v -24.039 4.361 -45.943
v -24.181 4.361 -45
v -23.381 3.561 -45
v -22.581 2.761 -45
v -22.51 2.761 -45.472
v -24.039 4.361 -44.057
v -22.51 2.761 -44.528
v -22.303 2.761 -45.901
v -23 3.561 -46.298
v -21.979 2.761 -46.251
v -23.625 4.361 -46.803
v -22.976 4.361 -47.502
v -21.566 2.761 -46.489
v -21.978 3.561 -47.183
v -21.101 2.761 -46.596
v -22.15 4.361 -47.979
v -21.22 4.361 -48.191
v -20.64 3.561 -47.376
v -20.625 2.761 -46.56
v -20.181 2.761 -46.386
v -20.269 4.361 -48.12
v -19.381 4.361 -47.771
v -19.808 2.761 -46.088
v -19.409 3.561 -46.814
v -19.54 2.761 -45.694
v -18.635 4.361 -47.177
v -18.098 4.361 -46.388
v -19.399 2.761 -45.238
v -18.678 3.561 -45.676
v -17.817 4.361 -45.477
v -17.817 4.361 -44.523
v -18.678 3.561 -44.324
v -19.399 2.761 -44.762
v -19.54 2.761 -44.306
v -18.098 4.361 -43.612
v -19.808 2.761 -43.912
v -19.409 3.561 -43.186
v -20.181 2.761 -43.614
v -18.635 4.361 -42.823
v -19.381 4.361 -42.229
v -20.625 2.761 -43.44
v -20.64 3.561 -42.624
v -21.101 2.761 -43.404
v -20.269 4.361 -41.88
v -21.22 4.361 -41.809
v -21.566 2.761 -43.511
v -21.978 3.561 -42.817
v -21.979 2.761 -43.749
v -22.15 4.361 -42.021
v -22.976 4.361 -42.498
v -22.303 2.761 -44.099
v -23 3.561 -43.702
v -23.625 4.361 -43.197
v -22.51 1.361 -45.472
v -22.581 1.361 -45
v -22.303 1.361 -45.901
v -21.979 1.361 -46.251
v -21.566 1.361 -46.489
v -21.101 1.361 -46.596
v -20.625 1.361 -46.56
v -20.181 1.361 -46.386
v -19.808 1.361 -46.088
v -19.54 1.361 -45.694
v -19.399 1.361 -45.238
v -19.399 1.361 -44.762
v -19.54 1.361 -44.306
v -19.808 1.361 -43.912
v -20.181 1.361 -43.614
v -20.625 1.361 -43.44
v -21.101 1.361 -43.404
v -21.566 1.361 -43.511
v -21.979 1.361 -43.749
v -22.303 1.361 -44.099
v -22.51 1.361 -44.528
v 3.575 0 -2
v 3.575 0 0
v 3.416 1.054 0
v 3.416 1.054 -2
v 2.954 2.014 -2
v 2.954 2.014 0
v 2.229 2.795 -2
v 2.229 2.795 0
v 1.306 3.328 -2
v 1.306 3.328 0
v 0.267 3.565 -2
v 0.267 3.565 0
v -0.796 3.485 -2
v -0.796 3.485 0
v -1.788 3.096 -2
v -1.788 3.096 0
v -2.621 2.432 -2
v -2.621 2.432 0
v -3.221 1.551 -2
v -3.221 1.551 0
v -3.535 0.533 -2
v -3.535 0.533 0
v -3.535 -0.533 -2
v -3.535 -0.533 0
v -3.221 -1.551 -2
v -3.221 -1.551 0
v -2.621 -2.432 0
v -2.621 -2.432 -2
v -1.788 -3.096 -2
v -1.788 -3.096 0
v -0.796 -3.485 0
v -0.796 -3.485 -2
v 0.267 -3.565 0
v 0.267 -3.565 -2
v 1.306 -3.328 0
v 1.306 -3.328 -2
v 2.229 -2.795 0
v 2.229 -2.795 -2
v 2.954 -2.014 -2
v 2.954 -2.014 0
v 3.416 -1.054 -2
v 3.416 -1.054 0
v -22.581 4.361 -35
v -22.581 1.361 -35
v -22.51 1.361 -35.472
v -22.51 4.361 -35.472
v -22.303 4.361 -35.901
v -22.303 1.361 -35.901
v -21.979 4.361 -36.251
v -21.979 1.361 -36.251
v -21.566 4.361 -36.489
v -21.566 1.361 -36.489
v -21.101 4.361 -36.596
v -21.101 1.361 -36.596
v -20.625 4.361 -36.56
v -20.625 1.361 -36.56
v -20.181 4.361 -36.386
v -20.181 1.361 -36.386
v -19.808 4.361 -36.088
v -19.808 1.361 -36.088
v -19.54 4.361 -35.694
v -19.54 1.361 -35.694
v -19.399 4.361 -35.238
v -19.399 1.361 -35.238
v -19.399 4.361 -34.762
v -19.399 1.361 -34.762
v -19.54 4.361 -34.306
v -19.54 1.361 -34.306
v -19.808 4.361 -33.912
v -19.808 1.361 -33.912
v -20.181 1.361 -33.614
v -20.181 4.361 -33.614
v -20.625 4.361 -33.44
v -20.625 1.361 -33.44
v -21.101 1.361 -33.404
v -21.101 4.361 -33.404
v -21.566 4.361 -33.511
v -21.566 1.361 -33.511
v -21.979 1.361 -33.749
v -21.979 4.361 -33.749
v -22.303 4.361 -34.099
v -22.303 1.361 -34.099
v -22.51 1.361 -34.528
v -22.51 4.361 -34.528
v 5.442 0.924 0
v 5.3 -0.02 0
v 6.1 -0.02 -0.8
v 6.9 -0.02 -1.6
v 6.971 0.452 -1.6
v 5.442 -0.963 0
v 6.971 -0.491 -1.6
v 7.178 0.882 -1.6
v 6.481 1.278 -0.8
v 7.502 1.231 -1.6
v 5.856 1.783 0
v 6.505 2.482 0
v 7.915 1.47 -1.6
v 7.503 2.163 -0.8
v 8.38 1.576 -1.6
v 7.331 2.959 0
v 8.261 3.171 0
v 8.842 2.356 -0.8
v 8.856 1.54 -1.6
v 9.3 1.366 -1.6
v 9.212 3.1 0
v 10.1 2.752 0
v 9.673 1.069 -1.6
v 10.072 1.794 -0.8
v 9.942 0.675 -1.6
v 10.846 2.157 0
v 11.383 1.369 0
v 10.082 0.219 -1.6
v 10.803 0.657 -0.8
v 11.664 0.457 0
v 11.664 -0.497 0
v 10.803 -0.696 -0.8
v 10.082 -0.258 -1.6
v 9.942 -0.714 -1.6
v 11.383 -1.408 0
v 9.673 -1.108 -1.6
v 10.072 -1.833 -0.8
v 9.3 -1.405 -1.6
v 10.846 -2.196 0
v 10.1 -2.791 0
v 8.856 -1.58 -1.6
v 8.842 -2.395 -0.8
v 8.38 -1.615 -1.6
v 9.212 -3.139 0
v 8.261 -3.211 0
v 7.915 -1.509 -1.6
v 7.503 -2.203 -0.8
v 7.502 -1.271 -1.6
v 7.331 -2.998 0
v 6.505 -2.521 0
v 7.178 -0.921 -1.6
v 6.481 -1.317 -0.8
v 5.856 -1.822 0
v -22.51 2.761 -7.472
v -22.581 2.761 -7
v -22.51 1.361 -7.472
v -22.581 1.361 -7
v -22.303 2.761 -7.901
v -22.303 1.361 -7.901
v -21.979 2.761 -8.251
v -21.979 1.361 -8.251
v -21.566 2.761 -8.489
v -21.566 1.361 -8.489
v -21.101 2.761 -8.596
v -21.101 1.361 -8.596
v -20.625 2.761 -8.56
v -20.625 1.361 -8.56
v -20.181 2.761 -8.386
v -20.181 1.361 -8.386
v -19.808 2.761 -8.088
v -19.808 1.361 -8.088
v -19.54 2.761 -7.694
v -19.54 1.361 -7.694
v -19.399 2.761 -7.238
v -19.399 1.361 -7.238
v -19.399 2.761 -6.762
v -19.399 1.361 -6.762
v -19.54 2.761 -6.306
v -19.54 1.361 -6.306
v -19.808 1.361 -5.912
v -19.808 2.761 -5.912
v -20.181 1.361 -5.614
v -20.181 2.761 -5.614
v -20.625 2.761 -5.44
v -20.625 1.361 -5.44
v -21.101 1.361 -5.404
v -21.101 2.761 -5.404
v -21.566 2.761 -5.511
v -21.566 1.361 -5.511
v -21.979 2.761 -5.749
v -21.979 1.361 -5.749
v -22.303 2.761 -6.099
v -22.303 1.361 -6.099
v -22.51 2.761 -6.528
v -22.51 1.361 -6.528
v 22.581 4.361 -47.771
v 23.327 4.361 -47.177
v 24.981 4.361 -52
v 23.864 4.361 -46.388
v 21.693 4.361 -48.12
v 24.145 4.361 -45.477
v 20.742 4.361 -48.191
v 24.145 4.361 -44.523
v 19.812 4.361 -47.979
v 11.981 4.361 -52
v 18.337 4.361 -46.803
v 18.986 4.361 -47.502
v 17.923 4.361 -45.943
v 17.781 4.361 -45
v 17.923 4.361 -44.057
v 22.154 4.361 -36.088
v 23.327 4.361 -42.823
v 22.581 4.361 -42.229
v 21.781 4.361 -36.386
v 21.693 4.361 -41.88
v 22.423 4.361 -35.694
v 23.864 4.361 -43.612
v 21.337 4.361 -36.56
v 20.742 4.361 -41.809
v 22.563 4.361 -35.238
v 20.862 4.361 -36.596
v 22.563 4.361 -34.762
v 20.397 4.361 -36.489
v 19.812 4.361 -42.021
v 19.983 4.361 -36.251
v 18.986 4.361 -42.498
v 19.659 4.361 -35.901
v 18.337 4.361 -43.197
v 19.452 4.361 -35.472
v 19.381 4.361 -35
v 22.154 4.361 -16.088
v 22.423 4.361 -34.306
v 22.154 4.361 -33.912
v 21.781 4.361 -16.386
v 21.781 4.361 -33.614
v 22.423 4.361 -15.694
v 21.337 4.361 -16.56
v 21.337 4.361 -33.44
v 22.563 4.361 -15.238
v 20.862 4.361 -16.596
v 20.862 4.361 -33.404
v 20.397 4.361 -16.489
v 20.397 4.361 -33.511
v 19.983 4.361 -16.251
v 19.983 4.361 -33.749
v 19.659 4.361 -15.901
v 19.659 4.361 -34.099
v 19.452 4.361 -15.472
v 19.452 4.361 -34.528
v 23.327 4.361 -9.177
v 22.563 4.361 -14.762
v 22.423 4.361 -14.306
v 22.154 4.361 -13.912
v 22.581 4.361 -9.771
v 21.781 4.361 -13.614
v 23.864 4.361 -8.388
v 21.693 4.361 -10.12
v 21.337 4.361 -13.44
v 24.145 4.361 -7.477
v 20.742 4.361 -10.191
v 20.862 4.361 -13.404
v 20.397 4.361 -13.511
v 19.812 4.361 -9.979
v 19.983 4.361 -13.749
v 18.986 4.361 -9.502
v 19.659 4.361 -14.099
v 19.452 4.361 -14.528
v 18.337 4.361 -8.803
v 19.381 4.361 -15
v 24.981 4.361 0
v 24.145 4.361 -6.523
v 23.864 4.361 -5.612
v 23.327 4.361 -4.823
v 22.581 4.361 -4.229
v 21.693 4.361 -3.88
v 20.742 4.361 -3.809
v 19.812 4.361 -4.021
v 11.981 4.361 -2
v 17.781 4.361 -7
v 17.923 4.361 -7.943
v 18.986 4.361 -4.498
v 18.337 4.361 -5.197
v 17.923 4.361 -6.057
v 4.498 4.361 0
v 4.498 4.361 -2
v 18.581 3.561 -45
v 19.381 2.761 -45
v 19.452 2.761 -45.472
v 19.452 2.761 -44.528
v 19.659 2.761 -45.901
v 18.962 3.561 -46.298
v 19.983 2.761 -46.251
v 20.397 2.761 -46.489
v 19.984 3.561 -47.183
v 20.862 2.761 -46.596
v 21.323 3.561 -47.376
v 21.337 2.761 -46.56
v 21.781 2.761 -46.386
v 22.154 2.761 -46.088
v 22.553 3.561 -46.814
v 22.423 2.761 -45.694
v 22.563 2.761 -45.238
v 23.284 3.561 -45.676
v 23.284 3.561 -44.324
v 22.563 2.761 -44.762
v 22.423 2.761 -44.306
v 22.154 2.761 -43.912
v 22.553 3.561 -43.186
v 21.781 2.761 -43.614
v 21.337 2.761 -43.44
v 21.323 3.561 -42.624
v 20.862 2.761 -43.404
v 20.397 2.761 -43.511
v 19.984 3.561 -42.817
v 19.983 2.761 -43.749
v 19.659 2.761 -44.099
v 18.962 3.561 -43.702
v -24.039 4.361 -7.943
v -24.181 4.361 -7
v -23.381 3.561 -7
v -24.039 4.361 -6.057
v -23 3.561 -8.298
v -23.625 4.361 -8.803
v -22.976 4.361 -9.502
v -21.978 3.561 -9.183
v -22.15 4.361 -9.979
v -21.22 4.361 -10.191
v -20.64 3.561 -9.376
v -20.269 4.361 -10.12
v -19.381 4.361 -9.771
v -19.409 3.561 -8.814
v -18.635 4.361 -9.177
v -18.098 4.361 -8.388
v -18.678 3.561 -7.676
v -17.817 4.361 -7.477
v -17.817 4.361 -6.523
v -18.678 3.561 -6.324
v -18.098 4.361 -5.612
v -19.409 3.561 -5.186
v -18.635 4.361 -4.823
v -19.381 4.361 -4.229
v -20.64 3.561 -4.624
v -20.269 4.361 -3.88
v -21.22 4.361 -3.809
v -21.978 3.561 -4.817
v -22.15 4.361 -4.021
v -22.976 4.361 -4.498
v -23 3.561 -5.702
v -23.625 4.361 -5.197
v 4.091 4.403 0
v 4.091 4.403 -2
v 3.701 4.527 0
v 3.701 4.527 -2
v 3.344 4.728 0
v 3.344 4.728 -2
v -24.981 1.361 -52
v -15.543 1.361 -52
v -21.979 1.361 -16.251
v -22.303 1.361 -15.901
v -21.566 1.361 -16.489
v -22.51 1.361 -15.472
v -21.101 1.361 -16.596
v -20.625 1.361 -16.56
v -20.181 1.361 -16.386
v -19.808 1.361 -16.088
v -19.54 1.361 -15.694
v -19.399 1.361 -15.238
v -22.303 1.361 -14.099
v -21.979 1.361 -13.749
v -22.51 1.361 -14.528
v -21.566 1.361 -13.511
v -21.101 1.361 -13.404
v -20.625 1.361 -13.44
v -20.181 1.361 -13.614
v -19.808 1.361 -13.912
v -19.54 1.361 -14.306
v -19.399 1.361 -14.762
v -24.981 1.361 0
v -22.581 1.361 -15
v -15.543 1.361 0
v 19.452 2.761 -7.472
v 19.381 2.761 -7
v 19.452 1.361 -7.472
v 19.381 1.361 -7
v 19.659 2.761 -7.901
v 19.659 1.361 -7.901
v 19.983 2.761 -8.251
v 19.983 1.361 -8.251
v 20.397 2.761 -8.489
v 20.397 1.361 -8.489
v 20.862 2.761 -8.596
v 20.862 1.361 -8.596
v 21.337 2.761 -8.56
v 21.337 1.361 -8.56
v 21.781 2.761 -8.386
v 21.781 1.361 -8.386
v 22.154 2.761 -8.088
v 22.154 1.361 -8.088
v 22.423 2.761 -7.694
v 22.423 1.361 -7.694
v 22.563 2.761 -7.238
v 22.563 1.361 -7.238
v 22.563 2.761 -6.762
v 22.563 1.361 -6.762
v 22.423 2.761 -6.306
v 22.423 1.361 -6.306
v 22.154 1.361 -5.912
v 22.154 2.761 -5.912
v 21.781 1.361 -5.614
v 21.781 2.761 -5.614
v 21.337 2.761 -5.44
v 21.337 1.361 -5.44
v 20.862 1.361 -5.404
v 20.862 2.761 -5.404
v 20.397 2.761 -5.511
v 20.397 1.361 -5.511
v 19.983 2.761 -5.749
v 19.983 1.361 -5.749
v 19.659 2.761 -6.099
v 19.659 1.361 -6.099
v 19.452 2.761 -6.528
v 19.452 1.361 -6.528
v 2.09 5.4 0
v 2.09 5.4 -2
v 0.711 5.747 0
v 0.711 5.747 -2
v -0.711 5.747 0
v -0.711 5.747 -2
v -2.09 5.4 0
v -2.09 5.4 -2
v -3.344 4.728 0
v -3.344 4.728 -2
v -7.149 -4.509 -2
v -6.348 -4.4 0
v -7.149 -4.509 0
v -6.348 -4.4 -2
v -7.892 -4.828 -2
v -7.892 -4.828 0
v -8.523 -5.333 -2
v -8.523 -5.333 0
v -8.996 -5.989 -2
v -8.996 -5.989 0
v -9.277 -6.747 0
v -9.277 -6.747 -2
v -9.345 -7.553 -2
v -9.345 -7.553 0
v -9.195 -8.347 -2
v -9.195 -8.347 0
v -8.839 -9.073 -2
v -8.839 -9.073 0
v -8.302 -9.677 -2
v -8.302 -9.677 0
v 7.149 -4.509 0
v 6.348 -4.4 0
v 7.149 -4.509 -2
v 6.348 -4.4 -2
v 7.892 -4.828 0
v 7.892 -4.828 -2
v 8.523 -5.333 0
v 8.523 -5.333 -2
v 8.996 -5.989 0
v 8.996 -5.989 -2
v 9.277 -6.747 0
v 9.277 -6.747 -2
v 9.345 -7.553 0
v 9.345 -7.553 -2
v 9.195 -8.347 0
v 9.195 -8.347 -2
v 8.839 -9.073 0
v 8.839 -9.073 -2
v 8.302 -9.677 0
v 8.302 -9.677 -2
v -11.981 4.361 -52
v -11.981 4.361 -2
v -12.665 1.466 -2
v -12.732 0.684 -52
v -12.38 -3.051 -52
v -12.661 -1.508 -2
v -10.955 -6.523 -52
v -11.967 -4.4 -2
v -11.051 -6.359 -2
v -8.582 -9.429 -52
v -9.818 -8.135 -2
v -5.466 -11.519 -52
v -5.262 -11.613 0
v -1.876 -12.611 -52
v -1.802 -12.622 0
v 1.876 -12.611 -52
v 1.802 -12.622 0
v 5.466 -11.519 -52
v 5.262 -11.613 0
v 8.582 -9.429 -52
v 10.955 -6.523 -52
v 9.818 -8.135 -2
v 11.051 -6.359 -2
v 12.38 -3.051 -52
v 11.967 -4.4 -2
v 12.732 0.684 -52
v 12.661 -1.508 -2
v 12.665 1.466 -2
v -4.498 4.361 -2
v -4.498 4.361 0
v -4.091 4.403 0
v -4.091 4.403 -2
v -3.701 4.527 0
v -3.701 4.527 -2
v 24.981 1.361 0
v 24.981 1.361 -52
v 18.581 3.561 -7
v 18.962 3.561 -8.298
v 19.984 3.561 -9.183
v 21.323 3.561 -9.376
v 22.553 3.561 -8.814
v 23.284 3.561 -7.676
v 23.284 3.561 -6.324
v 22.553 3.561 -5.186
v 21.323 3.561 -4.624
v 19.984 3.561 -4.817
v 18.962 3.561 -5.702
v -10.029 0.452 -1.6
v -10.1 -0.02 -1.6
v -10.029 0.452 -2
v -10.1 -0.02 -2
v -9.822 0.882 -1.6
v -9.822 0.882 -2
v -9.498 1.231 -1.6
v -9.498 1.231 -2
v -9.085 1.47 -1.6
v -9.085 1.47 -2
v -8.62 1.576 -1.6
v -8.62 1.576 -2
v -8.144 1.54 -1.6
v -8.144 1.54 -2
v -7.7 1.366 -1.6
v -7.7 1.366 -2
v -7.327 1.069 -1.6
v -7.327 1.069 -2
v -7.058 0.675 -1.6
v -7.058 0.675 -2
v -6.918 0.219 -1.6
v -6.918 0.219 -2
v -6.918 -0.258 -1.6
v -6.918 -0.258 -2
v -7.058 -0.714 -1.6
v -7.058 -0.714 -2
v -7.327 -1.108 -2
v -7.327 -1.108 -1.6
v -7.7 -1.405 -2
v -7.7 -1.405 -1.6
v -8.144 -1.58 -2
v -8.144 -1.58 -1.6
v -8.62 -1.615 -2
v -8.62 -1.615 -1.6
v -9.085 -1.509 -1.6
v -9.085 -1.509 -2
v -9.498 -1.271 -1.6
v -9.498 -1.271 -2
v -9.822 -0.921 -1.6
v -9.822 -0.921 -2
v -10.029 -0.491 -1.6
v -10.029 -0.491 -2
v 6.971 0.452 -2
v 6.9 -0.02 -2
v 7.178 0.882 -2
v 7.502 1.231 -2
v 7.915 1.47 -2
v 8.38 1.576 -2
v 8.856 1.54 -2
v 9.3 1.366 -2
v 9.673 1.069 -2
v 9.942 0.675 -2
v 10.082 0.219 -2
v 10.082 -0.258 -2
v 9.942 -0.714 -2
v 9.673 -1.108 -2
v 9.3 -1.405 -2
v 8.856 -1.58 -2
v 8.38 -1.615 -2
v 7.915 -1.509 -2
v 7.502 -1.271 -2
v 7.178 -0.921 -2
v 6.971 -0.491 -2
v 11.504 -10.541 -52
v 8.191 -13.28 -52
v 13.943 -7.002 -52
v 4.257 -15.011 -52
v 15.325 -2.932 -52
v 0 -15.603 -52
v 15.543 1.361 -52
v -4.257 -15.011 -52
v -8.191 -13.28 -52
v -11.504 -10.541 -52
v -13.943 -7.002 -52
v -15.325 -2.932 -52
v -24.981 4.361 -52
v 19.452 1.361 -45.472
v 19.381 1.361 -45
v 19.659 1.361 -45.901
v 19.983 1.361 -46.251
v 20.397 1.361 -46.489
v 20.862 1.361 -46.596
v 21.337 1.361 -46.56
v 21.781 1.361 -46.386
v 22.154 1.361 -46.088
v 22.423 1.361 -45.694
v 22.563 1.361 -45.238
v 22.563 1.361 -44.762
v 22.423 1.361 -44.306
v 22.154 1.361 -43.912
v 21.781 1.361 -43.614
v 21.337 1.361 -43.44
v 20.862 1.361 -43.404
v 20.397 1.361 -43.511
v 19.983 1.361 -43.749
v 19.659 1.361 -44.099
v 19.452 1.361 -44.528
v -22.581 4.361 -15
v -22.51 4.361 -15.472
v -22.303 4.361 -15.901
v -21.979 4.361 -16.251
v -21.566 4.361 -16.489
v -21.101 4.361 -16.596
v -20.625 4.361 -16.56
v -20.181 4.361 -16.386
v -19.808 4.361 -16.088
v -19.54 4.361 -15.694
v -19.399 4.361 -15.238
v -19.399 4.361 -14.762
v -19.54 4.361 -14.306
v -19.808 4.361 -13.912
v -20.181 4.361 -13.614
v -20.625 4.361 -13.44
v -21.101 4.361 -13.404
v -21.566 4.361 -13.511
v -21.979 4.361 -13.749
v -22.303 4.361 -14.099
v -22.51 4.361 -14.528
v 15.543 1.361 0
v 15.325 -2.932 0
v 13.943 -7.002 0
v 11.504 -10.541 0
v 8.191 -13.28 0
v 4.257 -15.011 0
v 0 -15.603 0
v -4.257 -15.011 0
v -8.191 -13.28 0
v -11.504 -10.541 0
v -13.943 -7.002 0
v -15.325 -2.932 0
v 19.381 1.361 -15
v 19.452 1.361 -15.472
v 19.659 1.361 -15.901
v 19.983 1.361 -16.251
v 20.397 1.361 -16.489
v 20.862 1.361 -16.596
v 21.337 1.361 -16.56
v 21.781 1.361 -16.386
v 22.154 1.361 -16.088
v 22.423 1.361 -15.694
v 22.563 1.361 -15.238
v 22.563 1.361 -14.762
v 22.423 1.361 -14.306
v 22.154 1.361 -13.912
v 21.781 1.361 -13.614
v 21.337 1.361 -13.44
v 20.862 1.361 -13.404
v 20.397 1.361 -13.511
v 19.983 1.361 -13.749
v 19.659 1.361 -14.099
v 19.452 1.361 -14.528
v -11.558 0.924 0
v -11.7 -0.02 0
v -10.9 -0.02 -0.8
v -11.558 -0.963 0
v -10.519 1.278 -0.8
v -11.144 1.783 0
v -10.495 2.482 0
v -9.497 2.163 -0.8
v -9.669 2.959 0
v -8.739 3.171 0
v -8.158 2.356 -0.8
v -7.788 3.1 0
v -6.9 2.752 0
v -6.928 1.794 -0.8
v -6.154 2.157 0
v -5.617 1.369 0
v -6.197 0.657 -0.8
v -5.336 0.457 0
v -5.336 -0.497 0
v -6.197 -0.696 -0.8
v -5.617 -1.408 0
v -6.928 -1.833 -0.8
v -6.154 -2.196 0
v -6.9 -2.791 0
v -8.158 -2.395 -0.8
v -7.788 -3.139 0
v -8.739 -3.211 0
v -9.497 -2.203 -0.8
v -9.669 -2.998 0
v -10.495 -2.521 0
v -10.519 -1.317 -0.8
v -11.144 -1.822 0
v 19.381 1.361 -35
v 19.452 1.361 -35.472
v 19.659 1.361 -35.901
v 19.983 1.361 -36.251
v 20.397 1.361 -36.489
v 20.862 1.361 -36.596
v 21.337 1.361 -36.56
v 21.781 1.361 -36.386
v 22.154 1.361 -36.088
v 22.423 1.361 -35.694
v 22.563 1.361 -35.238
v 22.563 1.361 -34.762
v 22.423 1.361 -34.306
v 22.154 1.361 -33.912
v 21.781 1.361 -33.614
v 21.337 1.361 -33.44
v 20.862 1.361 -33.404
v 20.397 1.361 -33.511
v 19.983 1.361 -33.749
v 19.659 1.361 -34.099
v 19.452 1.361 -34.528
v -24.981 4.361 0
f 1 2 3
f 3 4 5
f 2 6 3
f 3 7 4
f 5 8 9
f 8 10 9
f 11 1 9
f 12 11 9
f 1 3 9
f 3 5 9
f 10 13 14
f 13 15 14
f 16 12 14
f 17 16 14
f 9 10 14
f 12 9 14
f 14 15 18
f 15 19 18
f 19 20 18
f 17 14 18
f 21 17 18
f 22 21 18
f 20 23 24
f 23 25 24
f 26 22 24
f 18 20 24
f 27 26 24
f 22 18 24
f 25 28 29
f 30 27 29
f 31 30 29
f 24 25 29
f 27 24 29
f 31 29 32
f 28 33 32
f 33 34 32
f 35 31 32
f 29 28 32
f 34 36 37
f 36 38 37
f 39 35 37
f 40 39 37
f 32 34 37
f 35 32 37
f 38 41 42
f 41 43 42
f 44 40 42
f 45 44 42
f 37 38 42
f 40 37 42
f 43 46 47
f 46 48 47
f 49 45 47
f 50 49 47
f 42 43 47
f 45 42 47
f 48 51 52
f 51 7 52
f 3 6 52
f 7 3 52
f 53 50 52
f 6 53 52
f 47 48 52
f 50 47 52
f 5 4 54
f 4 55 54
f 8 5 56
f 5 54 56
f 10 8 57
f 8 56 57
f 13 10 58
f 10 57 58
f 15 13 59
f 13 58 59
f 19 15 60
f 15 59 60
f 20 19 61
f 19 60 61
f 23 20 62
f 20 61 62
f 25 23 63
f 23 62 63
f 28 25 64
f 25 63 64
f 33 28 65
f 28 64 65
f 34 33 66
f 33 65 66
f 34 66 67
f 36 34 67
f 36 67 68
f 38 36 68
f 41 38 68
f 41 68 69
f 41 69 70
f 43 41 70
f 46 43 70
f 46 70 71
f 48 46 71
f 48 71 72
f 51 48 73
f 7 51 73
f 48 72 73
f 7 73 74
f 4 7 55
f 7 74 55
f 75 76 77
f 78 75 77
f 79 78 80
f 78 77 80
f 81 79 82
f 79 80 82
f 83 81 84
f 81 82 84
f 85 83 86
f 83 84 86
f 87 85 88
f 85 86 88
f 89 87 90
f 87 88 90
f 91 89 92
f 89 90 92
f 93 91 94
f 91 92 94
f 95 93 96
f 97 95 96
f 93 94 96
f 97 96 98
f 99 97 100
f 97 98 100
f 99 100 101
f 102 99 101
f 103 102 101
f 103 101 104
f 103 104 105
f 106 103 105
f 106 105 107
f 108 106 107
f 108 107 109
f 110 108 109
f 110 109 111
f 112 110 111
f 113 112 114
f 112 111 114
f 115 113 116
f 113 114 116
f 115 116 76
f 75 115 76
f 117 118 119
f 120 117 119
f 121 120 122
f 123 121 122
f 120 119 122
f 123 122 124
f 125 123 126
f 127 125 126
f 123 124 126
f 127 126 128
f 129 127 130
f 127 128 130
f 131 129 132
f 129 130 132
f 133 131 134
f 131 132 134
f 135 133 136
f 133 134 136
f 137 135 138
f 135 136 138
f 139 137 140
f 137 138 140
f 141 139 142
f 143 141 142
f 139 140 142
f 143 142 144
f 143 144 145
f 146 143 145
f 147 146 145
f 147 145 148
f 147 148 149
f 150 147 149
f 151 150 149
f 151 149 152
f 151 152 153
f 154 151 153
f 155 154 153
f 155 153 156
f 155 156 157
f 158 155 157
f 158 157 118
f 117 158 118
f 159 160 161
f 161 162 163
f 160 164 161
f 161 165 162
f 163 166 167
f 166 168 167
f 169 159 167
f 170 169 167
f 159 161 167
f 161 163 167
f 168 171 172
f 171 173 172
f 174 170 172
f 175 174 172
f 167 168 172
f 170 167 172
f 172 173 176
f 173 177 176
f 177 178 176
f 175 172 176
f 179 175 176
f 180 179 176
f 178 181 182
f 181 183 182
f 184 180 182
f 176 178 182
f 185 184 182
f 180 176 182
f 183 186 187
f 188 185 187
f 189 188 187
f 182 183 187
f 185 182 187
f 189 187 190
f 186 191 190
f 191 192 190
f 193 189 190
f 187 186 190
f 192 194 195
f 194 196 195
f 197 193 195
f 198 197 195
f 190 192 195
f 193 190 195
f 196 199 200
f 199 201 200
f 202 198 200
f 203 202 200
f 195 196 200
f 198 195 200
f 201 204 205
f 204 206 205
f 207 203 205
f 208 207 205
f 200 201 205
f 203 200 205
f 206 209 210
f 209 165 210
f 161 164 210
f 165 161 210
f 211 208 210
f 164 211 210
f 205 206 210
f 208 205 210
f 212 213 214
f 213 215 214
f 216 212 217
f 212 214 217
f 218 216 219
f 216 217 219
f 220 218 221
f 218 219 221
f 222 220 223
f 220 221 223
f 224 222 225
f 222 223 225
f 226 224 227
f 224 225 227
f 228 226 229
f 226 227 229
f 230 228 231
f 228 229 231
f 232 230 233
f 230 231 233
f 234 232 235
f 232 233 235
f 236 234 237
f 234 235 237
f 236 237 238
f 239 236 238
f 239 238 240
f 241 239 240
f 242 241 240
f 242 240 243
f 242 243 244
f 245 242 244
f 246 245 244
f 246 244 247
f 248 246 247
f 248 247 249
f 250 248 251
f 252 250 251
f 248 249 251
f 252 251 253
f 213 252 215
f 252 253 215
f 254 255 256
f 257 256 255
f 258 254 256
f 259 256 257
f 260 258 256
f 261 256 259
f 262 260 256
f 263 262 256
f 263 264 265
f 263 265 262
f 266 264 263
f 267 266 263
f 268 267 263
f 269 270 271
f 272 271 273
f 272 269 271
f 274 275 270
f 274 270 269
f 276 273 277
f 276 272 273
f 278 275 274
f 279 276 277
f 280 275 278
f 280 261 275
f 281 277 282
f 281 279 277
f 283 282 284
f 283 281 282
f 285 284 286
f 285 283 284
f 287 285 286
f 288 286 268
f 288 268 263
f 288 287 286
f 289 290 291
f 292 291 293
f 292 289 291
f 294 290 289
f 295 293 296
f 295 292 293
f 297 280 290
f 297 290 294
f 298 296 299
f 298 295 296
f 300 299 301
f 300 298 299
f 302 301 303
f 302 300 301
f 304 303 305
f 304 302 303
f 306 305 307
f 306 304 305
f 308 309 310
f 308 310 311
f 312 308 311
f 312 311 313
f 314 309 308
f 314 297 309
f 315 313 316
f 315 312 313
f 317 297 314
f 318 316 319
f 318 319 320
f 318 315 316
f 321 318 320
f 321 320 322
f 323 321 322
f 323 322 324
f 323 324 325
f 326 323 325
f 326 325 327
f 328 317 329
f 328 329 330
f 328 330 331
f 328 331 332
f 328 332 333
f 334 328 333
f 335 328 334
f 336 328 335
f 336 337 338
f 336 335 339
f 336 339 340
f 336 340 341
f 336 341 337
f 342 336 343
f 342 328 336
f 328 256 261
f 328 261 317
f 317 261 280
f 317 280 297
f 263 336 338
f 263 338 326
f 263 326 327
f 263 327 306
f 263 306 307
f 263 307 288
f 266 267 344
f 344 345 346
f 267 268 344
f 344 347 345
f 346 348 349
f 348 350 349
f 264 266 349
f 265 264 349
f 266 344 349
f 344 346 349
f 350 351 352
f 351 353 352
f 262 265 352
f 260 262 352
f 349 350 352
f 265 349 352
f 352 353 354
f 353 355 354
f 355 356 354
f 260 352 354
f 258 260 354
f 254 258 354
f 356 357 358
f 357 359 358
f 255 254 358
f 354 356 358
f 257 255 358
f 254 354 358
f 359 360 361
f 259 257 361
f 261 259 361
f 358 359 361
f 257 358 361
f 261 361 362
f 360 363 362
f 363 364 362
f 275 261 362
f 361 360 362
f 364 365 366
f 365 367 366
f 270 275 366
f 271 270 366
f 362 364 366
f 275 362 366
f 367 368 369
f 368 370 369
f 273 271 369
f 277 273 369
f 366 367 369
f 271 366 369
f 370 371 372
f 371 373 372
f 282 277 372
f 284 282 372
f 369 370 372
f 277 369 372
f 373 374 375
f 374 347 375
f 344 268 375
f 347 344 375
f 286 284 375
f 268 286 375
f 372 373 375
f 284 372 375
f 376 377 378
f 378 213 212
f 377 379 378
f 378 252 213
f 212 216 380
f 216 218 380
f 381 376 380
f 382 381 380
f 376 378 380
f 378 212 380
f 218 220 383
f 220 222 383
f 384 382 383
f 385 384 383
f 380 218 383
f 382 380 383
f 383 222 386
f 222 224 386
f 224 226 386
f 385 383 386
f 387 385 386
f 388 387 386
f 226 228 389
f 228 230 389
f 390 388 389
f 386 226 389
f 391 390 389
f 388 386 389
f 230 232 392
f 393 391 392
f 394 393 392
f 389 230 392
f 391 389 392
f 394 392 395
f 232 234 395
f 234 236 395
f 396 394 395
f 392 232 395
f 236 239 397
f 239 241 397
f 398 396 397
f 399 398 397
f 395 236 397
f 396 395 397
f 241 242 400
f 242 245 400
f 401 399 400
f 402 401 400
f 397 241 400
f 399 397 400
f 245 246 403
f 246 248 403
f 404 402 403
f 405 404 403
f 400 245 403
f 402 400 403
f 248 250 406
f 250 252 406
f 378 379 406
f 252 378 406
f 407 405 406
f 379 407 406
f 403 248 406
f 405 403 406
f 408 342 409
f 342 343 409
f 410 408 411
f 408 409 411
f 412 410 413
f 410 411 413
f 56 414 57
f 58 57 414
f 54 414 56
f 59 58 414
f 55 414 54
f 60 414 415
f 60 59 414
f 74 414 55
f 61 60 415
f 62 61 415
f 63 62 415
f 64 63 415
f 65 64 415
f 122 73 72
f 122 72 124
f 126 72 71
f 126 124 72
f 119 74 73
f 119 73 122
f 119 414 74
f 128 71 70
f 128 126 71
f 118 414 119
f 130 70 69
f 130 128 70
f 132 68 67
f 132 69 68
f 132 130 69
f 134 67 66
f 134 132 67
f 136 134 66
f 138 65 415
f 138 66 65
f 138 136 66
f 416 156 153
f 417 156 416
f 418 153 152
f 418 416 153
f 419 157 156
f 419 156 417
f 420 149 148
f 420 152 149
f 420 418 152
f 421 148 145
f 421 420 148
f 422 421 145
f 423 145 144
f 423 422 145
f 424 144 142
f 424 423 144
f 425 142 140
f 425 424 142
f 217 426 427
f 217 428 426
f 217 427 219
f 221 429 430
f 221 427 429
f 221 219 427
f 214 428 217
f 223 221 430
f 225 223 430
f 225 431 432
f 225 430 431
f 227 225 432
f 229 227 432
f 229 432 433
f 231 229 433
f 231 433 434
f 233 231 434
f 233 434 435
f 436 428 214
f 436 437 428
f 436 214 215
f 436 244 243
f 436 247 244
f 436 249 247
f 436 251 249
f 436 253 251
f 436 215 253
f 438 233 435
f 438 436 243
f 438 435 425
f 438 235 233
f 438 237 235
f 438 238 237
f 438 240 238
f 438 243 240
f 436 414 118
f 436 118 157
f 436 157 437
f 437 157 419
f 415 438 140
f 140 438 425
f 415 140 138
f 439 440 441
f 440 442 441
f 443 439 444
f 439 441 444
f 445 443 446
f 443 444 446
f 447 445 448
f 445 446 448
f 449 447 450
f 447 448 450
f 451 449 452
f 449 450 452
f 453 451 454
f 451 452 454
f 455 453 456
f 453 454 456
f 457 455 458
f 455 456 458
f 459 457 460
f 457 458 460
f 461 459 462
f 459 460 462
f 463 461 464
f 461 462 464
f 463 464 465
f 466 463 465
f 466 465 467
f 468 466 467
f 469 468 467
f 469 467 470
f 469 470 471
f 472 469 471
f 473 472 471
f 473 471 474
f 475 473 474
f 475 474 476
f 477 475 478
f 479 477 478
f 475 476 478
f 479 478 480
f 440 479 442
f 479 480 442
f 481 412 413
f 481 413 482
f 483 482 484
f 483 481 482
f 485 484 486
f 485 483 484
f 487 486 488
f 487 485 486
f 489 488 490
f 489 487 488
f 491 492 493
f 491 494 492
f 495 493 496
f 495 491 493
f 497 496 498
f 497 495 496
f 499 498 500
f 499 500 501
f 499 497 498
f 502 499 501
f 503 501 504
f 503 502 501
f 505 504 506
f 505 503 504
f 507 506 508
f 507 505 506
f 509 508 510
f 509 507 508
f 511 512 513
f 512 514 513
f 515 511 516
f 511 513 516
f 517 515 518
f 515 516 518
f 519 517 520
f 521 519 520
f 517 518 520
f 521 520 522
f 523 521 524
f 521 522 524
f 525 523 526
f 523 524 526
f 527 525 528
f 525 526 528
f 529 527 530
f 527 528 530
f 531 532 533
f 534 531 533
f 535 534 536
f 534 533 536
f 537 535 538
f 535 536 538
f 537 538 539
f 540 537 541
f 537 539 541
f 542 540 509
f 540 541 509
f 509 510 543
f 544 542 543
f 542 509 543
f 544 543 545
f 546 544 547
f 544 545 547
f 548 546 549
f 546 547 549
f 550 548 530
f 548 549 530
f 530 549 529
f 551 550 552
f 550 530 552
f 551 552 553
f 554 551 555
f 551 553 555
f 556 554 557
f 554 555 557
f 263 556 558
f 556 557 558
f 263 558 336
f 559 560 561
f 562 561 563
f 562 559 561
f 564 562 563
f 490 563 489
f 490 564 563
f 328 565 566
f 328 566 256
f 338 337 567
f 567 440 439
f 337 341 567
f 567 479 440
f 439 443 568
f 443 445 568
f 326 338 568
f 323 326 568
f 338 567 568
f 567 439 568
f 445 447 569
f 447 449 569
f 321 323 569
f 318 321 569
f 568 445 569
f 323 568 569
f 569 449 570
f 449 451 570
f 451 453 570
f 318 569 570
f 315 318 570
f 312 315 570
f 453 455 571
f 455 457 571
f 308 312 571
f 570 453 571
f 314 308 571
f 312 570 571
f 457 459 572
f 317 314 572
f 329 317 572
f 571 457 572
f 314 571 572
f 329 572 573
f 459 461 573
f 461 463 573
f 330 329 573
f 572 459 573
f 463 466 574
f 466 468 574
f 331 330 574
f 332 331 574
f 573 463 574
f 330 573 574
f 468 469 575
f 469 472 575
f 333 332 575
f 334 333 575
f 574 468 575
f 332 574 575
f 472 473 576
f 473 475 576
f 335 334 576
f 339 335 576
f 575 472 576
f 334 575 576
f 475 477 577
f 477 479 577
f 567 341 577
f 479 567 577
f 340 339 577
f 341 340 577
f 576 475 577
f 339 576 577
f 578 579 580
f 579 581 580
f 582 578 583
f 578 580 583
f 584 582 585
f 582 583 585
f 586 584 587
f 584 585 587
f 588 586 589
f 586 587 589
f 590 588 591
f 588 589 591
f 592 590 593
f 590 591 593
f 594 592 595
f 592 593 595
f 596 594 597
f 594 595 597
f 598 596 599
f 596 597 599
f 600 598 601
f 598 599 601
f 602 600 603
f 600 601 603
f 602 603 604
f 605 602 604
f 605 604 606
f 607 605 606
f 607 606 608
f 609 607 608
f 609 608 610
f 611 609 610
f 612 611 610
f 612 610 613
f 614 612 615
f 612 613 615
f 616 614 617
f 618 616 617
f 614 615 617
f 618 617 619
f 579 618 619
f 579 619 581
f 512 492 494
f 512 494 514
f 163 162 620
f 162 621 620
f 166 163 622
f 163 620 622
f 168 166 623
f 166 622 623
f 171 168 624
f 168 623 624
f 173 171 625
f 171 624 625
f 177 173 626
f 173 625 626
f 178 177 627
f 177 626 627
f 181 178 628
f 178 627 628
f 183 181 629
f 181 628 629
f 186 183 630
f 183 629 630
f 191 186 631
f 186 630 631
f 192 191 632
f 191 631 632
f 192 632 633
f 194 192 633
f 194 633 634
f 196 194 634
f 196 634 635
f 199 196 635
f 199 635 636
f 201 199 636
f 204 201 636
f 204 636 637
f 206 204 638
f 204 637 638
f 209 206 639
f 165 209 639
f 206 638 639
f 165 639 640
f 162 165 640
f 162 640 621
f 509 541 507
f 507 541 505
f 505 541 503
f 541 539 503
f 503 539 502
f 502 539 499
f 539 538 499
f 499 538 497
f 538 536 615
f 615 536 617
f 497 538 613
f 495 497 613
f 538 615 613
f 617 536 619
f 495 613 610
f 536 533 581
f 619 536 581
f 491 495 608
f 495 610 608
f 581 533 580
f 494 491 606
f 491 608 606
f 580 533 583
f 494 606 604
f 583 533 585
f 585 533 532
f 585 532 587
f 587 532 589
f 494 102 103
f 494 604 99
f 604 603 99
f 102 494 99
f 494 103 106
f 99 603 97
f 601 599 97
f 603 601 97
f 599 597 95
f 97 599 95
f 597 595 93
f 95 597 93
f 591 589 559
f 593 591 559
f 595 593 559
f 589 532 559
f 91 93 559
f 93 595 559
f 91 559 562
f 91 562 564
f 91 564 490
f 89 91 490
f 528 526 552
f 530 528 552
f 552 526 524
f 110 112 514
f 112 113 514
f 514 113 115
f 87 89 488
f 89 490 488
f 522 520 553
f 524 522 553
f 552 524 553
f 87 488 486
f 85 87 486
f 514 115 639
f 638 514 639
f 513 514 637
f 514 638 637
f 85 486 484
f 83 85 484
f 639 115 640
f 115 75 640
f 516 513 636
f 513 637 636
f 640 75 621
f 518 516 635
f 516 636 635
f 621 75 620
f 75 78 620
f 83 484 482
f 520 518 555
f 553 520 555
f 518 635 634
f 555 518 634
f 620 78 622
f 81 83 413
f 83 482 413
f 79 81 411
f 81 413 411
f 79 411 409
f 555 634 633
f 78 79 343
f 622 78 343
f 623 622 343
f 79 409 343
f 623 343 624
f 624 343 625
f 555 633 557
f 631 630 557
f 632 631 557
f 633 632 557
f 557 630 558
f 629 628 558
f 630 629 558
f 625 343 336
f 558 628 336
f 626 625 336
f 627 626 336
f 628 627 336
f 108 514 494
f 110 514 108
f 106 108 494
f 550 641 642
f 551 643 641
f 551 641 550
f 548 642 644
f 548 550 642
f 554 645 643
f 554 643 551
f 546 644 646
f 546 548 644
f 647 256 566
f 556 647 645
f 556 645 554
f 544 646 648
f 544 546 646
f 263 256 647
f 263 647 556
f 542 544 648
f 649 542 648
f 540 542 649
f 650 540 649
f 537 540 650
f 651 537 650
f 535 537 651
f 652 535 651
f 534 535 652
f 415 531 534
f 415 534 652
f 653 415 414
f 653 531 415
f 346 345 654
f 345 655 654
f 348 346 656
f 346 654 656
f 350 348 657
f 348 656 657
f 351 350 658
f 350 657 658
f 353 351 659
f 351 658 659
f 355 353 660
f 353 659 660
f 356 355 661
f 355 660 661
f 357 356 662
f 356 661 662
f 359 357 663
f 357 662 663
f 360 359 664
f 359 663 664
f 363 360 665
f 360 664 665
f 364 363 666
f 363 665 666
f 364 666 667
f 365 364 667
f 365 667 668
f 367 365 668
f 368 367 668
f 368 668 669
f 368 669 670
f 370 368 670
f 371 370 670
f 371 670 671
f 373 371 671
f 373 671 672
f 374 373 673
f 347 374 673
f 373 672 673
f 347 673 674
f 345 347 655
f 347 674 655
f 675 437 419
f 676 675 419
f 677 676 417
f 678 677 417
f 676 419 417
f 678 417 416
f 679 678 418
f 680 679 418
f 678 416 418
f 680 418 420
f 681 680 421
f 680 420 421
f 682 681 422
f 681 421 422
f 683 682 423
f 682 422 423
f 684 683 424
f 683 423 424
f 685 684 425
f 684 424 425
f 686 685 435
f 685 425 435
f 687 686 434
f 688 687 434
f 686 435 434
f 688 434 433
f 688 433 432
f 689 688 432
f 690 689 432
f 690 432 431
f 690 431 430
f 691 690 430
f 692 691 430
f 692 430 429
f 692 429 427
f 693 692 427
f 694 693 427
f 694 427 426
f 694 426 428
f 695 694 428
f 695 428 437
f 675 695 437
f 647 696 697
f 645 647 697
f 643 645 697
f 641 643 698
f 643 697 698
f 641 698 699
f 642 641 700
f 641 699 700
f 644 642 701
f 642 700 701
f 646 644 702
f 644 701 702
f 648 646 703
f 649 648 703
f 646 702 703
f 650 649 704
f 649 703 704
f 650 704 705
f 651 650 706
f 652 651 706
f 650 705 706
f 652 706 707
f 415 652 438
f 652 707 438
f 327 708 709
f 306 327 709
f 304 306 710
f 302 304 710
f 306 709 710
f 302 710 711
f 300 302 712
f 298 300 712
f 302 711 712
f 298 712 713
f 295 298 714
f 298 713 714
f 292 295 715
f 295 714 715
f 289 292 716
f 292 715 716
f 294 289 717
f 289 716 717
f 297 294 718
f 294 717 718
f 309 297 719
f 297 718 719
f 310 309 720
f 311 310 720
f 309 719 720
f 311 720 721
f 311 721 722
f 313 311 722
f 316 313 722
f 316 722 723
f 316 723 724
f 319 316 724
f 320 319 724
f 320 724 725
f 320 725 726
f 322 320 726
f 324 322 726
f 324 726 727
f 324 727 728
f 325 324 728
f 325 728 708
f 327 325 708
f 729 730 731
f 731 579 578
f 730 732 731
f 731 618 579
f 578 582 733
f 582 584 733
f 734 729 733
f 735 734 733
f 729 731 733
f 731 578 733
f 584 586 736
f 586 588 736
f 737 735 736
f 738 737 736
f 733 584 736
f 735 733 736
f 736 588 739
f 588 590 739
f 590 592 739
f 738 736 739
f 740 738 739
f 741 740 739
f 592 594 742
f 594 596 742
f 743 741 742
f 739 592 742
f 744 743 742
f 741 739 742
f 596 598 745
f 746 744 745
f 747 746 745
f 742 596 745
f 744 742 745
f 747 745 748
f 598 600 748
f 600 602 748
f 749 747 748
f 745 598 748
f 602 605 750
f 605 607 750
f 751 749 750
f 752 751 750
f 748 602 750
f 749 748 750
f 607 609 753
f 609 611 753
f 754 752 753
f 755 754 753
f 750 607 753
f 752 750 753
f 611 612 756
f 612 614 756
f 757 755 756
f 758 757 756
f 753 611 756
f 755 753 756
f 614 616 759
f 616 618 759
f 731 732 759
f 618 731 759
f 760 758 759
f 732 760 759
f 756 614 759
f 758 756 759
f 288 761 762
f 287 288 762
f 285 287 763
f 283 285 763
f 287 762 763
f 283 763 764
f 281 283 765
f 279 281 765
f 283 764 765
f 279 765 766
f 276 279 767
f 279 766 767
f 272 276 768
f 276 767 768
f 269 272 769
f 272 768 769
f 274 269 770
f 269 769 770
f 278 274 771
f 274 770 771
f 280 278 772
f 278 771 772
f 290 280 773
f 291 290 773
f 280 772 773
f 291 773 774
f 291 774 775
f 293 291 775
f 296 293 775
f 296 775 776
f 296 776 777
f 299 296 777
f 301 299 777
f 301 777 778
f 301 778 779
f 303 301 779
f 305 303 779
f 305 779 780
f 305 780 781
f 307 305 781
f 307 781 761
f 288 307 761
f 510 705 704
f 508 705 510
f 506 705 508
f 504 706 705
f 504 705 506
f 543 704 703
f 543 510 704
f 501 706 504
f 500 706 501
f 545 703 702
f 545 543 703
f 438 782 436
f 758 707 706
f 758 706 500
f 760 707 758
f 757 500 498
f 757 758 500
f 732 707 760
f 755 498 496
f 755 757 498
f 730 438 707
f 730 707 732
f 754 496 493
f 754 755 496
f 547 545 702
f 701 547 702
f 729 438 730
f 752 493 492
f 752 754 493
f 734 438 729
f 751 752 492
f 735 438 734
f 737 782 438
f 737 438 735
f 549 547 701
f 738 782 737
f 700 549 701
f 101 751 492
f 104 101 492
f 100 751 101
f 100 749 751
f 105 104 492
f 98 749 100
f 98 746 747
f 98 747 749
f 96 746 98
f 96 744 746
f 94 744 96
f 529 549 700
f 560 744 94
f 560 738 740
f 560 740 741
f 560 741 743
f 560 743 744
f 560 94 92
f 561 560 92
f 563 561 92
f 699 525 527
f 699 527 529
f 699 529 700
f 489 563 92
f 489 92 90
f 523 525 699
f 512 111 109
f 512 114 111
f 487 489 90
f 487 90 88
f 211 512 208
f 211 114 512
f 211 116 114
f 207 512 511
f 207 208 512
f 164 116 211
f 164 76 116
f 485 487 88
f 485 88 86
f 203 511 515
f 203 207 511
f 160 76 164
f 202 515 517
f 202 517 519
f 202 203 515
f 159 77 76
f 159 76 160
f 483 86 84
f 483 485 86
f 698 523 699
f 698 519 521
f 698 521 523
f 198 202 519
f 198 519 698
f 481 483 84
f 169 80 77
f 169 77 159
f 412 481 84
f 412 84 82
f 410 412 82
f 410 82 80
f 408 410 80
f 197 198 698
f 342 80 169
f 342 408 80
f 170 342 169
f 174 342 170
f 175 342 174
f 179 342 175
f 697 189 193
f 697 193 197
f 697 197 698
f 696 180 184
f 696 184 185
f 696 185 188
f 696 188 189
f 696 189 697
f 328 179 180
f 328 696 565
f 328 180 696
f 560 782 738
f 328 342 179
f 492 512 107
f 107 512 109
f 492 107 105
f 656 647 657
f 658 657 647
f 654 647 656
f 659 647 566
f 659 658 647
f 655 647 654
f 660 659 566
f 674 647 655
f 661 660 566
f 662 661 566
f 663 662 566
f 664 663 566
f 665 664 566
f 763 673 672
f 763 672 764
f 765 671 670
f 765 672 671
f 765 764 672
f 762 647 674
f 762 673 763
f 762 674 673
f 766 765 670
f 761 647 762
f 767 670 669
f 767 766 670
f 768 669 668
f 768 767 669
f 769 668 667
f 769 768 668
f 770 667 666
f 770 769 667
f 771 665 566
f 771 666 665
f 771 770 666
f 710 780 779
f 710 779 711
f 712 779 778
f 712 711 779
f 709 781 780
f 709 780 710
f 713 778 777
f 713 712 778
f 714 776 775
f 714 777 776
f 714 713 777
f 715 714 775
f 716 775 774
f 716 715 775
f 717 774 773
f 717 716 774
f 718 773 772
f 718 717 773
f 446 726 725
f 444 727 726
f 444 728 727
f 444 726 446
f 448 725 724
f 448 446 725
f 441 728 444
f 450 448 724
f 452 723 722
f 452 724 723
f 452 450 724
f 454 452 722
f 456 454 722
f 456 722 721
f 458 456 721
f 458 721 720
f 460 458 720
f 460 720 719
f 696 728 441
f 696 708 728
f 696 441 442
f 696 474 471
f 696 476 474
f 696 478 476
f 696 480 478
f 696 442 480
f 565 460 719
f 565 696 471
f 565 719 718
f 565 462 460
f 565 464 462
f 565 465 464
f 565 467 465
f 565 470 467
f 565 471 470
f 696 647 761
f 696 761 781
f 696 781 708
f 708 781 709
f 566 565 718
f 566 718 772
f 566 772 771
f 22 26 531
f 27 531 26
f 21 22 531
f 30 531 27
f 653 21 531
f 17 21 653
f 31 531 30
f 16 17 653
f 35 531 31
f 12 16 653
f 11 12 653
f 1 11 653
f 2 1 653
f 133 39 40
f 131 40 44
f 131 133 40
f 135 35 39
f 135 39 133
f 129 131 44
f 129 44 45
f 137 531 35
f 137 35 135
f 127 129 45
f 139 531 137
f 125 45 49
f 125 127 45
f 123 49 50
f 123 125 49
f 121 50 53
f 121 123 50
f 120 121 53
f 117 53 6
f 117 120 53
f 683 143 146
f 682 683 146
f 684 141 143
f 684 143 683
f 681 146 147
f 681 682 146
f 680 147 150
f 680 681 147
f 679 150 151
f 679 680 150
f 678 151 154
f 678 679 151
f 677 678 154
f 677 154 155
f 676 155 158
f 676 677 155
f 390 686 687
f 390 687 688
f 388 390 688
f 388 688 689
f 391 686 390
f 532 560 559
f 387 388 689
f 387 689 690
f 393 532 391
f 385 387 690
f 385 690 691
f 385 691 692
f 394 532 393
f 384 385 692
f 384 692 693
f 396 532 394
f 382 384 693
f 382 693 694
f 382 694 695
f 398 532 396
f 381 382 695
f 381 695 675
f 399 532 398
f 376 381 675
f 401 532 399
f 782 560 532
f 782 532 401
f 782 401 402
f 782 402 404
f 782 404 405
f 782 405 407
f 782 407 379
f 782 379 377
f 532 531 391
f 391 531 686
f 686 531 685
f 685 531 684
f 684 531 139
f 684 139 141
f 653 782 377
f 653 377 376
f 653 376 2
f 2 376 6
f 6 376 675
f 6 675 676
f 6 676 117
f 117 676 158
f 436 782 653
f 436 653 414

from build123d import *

# Parameters (mm, degrees)
BOSS_EXTRUDE1_DEPTH = 52
SKETCH3_R           = 3.575
BOSS_EXTRUDE2_DEPTH = 2
FILLET2_R           = 2
HOLE1_D             = 3.2
HOLE1_CSINK_D       = 6.4
HOLE1_CSINK_ANGLE   = 90
HOLE2_D             = 3.2
HOLE3_D             = 3.2
HOLE3_CSINK_D       = 6.4
HOLE3_CSINK_ANGLE   = 90
FILLET1_R           = 3


with BuildPart() as part:
    # Sketch1 → Boss-Extrude1 (new body)
    with BuildSketch(Plane.XY):
        with BuildLine():
            ThreePointArc((14.981080915, 4.360756827), (0, -15.602851838), (-14.981080915, 4.360756827))
            Line((-14.981080915, 4.360756827), (-11.981080915, 4.360756827))
            ThreePointArc((-11.981080915, 4.360756827), (0, -12.75), (11.981080915, 4.360756827))
            Line((11.981080915, 4.360756827), (14.981080915, 4.360756827))
        make_face()
        with BuildLine():
            ThreePointArc((-15.543401376, 1.360756827), (-15.335775324, 2.874540085), (-14.981080915, 4.360756827))
            Line((-14.981080915, 4.360756827), (-24.981080915, 4.360756827))
            Line((-24.981080915, 4.360756827), (-24.981080915, 1.360756827))
            Line((-24.981080915, 1.360756827), (-15.543401376, 1.360756827))
        make_face()
        with BuildLine():
            Line((24.981080915, 4.360756827), (14.981080915, 4.360756827))
            ThreePointArc((14.981080915, 4.360756827), (15.335775324, 2.874540085), (15.543401376, 1.360756827))
            Line((15.543401376, 1.360756827), (24.981080915, 1.360756827))
            Line((24.981080915, 1.360756827), (24.981080915, 4.360756827))
        make_face()
    extrude(amount=-BOSS_EXTRUDE1_DEPTH)

    # Sketch3 → Boss-Extrude2 (add)
    with BuildSketch(Plane.XY):
        with BuildLine():
            Line((-3.809974466, 4.360756827), (-11.981080915, 4.360756827))
            ThreePointArc((-11.981080915, 4.360756827), (-12.749982881, -0.020893346), (-11.966724698, -4.4))
            Line((-11.966724698, -4.4), (11.966724698, -4.4))
            ThreePointArc((11.966724698, -4.4), (12.749982881, -0.020893346), (11.981080915, 4.360756827))
            Line((11.981080915, 4.360756827), (3.809974466, 4.360756827))
            ThreePointArc((3.809974466, 4.360756827), (0, 5.790691284), (-3.809974466, 4.360756827))
        make_face()
        Circle(SKETCH3_R, mode=Mode.SUBTRACT)
    extrude(amount=-BOSS_EXTRUDE2_DEPTH)

    # Fillet2
    fillet2_edges = [part.edges().sort_by_distance(p)[0] for p in [
        (-3.809974466, 4.360756827, -1),
        (3.809974466, 4.360756827, -1),
    ]]
    fillet(fillet2_edges, radius=FILLET2_R)

    # Hole1 (through all)
    with Locations(Plane(origin=(-8.5, -0.019621586, 0), x_dir=(1, 0, 0), z_dir=(0, 0, 1))):
        with Locations((0, 0), (17, 0)):
            CounterSinkHole(HOLE1_D / 2, HOLE1_CSINK_D / 2, counter_sink_angle=HOLE1_CSINK_ANGLE)

    # Hole2 (through all)
    with Locations(Plane(origin=(-20.981080915, 4.360756827, -35), x_dir=(1, 0, 0), z_dir=(0, 1, 0))):
        with Locations((0, 0), (0, -20), (41.96216183, -20), (41.96216183, 0)):
            Hole(HOLE2_D / 2)

    # Hole3 (through all)
    with Locations(Plane(origin=(-20.981080915, 4.360756827, -7), x_dir=(1, 0, 0), z_dir=(0, 1, 0))):
        with Locations((0, 0), (0, 38), (41.96216183, 38), (41.96216183, 0)):
            CounterSinkHole(HOLE3_D / 2, HOLE3_CSINK_D / 2, counter_sink_angle=HOLE3_CSINK_ANGLE)

    # Fillet1
    fillet1_edges = [part.edges().sort_by_distance(p)[0] for p in [
        (11.966724698, -4.4, -1),
        (-11.966724698, -4.4, -1),
    ]]
    fillet(fillet1_edges, radius=FILLET1_R)


solid = part.part
